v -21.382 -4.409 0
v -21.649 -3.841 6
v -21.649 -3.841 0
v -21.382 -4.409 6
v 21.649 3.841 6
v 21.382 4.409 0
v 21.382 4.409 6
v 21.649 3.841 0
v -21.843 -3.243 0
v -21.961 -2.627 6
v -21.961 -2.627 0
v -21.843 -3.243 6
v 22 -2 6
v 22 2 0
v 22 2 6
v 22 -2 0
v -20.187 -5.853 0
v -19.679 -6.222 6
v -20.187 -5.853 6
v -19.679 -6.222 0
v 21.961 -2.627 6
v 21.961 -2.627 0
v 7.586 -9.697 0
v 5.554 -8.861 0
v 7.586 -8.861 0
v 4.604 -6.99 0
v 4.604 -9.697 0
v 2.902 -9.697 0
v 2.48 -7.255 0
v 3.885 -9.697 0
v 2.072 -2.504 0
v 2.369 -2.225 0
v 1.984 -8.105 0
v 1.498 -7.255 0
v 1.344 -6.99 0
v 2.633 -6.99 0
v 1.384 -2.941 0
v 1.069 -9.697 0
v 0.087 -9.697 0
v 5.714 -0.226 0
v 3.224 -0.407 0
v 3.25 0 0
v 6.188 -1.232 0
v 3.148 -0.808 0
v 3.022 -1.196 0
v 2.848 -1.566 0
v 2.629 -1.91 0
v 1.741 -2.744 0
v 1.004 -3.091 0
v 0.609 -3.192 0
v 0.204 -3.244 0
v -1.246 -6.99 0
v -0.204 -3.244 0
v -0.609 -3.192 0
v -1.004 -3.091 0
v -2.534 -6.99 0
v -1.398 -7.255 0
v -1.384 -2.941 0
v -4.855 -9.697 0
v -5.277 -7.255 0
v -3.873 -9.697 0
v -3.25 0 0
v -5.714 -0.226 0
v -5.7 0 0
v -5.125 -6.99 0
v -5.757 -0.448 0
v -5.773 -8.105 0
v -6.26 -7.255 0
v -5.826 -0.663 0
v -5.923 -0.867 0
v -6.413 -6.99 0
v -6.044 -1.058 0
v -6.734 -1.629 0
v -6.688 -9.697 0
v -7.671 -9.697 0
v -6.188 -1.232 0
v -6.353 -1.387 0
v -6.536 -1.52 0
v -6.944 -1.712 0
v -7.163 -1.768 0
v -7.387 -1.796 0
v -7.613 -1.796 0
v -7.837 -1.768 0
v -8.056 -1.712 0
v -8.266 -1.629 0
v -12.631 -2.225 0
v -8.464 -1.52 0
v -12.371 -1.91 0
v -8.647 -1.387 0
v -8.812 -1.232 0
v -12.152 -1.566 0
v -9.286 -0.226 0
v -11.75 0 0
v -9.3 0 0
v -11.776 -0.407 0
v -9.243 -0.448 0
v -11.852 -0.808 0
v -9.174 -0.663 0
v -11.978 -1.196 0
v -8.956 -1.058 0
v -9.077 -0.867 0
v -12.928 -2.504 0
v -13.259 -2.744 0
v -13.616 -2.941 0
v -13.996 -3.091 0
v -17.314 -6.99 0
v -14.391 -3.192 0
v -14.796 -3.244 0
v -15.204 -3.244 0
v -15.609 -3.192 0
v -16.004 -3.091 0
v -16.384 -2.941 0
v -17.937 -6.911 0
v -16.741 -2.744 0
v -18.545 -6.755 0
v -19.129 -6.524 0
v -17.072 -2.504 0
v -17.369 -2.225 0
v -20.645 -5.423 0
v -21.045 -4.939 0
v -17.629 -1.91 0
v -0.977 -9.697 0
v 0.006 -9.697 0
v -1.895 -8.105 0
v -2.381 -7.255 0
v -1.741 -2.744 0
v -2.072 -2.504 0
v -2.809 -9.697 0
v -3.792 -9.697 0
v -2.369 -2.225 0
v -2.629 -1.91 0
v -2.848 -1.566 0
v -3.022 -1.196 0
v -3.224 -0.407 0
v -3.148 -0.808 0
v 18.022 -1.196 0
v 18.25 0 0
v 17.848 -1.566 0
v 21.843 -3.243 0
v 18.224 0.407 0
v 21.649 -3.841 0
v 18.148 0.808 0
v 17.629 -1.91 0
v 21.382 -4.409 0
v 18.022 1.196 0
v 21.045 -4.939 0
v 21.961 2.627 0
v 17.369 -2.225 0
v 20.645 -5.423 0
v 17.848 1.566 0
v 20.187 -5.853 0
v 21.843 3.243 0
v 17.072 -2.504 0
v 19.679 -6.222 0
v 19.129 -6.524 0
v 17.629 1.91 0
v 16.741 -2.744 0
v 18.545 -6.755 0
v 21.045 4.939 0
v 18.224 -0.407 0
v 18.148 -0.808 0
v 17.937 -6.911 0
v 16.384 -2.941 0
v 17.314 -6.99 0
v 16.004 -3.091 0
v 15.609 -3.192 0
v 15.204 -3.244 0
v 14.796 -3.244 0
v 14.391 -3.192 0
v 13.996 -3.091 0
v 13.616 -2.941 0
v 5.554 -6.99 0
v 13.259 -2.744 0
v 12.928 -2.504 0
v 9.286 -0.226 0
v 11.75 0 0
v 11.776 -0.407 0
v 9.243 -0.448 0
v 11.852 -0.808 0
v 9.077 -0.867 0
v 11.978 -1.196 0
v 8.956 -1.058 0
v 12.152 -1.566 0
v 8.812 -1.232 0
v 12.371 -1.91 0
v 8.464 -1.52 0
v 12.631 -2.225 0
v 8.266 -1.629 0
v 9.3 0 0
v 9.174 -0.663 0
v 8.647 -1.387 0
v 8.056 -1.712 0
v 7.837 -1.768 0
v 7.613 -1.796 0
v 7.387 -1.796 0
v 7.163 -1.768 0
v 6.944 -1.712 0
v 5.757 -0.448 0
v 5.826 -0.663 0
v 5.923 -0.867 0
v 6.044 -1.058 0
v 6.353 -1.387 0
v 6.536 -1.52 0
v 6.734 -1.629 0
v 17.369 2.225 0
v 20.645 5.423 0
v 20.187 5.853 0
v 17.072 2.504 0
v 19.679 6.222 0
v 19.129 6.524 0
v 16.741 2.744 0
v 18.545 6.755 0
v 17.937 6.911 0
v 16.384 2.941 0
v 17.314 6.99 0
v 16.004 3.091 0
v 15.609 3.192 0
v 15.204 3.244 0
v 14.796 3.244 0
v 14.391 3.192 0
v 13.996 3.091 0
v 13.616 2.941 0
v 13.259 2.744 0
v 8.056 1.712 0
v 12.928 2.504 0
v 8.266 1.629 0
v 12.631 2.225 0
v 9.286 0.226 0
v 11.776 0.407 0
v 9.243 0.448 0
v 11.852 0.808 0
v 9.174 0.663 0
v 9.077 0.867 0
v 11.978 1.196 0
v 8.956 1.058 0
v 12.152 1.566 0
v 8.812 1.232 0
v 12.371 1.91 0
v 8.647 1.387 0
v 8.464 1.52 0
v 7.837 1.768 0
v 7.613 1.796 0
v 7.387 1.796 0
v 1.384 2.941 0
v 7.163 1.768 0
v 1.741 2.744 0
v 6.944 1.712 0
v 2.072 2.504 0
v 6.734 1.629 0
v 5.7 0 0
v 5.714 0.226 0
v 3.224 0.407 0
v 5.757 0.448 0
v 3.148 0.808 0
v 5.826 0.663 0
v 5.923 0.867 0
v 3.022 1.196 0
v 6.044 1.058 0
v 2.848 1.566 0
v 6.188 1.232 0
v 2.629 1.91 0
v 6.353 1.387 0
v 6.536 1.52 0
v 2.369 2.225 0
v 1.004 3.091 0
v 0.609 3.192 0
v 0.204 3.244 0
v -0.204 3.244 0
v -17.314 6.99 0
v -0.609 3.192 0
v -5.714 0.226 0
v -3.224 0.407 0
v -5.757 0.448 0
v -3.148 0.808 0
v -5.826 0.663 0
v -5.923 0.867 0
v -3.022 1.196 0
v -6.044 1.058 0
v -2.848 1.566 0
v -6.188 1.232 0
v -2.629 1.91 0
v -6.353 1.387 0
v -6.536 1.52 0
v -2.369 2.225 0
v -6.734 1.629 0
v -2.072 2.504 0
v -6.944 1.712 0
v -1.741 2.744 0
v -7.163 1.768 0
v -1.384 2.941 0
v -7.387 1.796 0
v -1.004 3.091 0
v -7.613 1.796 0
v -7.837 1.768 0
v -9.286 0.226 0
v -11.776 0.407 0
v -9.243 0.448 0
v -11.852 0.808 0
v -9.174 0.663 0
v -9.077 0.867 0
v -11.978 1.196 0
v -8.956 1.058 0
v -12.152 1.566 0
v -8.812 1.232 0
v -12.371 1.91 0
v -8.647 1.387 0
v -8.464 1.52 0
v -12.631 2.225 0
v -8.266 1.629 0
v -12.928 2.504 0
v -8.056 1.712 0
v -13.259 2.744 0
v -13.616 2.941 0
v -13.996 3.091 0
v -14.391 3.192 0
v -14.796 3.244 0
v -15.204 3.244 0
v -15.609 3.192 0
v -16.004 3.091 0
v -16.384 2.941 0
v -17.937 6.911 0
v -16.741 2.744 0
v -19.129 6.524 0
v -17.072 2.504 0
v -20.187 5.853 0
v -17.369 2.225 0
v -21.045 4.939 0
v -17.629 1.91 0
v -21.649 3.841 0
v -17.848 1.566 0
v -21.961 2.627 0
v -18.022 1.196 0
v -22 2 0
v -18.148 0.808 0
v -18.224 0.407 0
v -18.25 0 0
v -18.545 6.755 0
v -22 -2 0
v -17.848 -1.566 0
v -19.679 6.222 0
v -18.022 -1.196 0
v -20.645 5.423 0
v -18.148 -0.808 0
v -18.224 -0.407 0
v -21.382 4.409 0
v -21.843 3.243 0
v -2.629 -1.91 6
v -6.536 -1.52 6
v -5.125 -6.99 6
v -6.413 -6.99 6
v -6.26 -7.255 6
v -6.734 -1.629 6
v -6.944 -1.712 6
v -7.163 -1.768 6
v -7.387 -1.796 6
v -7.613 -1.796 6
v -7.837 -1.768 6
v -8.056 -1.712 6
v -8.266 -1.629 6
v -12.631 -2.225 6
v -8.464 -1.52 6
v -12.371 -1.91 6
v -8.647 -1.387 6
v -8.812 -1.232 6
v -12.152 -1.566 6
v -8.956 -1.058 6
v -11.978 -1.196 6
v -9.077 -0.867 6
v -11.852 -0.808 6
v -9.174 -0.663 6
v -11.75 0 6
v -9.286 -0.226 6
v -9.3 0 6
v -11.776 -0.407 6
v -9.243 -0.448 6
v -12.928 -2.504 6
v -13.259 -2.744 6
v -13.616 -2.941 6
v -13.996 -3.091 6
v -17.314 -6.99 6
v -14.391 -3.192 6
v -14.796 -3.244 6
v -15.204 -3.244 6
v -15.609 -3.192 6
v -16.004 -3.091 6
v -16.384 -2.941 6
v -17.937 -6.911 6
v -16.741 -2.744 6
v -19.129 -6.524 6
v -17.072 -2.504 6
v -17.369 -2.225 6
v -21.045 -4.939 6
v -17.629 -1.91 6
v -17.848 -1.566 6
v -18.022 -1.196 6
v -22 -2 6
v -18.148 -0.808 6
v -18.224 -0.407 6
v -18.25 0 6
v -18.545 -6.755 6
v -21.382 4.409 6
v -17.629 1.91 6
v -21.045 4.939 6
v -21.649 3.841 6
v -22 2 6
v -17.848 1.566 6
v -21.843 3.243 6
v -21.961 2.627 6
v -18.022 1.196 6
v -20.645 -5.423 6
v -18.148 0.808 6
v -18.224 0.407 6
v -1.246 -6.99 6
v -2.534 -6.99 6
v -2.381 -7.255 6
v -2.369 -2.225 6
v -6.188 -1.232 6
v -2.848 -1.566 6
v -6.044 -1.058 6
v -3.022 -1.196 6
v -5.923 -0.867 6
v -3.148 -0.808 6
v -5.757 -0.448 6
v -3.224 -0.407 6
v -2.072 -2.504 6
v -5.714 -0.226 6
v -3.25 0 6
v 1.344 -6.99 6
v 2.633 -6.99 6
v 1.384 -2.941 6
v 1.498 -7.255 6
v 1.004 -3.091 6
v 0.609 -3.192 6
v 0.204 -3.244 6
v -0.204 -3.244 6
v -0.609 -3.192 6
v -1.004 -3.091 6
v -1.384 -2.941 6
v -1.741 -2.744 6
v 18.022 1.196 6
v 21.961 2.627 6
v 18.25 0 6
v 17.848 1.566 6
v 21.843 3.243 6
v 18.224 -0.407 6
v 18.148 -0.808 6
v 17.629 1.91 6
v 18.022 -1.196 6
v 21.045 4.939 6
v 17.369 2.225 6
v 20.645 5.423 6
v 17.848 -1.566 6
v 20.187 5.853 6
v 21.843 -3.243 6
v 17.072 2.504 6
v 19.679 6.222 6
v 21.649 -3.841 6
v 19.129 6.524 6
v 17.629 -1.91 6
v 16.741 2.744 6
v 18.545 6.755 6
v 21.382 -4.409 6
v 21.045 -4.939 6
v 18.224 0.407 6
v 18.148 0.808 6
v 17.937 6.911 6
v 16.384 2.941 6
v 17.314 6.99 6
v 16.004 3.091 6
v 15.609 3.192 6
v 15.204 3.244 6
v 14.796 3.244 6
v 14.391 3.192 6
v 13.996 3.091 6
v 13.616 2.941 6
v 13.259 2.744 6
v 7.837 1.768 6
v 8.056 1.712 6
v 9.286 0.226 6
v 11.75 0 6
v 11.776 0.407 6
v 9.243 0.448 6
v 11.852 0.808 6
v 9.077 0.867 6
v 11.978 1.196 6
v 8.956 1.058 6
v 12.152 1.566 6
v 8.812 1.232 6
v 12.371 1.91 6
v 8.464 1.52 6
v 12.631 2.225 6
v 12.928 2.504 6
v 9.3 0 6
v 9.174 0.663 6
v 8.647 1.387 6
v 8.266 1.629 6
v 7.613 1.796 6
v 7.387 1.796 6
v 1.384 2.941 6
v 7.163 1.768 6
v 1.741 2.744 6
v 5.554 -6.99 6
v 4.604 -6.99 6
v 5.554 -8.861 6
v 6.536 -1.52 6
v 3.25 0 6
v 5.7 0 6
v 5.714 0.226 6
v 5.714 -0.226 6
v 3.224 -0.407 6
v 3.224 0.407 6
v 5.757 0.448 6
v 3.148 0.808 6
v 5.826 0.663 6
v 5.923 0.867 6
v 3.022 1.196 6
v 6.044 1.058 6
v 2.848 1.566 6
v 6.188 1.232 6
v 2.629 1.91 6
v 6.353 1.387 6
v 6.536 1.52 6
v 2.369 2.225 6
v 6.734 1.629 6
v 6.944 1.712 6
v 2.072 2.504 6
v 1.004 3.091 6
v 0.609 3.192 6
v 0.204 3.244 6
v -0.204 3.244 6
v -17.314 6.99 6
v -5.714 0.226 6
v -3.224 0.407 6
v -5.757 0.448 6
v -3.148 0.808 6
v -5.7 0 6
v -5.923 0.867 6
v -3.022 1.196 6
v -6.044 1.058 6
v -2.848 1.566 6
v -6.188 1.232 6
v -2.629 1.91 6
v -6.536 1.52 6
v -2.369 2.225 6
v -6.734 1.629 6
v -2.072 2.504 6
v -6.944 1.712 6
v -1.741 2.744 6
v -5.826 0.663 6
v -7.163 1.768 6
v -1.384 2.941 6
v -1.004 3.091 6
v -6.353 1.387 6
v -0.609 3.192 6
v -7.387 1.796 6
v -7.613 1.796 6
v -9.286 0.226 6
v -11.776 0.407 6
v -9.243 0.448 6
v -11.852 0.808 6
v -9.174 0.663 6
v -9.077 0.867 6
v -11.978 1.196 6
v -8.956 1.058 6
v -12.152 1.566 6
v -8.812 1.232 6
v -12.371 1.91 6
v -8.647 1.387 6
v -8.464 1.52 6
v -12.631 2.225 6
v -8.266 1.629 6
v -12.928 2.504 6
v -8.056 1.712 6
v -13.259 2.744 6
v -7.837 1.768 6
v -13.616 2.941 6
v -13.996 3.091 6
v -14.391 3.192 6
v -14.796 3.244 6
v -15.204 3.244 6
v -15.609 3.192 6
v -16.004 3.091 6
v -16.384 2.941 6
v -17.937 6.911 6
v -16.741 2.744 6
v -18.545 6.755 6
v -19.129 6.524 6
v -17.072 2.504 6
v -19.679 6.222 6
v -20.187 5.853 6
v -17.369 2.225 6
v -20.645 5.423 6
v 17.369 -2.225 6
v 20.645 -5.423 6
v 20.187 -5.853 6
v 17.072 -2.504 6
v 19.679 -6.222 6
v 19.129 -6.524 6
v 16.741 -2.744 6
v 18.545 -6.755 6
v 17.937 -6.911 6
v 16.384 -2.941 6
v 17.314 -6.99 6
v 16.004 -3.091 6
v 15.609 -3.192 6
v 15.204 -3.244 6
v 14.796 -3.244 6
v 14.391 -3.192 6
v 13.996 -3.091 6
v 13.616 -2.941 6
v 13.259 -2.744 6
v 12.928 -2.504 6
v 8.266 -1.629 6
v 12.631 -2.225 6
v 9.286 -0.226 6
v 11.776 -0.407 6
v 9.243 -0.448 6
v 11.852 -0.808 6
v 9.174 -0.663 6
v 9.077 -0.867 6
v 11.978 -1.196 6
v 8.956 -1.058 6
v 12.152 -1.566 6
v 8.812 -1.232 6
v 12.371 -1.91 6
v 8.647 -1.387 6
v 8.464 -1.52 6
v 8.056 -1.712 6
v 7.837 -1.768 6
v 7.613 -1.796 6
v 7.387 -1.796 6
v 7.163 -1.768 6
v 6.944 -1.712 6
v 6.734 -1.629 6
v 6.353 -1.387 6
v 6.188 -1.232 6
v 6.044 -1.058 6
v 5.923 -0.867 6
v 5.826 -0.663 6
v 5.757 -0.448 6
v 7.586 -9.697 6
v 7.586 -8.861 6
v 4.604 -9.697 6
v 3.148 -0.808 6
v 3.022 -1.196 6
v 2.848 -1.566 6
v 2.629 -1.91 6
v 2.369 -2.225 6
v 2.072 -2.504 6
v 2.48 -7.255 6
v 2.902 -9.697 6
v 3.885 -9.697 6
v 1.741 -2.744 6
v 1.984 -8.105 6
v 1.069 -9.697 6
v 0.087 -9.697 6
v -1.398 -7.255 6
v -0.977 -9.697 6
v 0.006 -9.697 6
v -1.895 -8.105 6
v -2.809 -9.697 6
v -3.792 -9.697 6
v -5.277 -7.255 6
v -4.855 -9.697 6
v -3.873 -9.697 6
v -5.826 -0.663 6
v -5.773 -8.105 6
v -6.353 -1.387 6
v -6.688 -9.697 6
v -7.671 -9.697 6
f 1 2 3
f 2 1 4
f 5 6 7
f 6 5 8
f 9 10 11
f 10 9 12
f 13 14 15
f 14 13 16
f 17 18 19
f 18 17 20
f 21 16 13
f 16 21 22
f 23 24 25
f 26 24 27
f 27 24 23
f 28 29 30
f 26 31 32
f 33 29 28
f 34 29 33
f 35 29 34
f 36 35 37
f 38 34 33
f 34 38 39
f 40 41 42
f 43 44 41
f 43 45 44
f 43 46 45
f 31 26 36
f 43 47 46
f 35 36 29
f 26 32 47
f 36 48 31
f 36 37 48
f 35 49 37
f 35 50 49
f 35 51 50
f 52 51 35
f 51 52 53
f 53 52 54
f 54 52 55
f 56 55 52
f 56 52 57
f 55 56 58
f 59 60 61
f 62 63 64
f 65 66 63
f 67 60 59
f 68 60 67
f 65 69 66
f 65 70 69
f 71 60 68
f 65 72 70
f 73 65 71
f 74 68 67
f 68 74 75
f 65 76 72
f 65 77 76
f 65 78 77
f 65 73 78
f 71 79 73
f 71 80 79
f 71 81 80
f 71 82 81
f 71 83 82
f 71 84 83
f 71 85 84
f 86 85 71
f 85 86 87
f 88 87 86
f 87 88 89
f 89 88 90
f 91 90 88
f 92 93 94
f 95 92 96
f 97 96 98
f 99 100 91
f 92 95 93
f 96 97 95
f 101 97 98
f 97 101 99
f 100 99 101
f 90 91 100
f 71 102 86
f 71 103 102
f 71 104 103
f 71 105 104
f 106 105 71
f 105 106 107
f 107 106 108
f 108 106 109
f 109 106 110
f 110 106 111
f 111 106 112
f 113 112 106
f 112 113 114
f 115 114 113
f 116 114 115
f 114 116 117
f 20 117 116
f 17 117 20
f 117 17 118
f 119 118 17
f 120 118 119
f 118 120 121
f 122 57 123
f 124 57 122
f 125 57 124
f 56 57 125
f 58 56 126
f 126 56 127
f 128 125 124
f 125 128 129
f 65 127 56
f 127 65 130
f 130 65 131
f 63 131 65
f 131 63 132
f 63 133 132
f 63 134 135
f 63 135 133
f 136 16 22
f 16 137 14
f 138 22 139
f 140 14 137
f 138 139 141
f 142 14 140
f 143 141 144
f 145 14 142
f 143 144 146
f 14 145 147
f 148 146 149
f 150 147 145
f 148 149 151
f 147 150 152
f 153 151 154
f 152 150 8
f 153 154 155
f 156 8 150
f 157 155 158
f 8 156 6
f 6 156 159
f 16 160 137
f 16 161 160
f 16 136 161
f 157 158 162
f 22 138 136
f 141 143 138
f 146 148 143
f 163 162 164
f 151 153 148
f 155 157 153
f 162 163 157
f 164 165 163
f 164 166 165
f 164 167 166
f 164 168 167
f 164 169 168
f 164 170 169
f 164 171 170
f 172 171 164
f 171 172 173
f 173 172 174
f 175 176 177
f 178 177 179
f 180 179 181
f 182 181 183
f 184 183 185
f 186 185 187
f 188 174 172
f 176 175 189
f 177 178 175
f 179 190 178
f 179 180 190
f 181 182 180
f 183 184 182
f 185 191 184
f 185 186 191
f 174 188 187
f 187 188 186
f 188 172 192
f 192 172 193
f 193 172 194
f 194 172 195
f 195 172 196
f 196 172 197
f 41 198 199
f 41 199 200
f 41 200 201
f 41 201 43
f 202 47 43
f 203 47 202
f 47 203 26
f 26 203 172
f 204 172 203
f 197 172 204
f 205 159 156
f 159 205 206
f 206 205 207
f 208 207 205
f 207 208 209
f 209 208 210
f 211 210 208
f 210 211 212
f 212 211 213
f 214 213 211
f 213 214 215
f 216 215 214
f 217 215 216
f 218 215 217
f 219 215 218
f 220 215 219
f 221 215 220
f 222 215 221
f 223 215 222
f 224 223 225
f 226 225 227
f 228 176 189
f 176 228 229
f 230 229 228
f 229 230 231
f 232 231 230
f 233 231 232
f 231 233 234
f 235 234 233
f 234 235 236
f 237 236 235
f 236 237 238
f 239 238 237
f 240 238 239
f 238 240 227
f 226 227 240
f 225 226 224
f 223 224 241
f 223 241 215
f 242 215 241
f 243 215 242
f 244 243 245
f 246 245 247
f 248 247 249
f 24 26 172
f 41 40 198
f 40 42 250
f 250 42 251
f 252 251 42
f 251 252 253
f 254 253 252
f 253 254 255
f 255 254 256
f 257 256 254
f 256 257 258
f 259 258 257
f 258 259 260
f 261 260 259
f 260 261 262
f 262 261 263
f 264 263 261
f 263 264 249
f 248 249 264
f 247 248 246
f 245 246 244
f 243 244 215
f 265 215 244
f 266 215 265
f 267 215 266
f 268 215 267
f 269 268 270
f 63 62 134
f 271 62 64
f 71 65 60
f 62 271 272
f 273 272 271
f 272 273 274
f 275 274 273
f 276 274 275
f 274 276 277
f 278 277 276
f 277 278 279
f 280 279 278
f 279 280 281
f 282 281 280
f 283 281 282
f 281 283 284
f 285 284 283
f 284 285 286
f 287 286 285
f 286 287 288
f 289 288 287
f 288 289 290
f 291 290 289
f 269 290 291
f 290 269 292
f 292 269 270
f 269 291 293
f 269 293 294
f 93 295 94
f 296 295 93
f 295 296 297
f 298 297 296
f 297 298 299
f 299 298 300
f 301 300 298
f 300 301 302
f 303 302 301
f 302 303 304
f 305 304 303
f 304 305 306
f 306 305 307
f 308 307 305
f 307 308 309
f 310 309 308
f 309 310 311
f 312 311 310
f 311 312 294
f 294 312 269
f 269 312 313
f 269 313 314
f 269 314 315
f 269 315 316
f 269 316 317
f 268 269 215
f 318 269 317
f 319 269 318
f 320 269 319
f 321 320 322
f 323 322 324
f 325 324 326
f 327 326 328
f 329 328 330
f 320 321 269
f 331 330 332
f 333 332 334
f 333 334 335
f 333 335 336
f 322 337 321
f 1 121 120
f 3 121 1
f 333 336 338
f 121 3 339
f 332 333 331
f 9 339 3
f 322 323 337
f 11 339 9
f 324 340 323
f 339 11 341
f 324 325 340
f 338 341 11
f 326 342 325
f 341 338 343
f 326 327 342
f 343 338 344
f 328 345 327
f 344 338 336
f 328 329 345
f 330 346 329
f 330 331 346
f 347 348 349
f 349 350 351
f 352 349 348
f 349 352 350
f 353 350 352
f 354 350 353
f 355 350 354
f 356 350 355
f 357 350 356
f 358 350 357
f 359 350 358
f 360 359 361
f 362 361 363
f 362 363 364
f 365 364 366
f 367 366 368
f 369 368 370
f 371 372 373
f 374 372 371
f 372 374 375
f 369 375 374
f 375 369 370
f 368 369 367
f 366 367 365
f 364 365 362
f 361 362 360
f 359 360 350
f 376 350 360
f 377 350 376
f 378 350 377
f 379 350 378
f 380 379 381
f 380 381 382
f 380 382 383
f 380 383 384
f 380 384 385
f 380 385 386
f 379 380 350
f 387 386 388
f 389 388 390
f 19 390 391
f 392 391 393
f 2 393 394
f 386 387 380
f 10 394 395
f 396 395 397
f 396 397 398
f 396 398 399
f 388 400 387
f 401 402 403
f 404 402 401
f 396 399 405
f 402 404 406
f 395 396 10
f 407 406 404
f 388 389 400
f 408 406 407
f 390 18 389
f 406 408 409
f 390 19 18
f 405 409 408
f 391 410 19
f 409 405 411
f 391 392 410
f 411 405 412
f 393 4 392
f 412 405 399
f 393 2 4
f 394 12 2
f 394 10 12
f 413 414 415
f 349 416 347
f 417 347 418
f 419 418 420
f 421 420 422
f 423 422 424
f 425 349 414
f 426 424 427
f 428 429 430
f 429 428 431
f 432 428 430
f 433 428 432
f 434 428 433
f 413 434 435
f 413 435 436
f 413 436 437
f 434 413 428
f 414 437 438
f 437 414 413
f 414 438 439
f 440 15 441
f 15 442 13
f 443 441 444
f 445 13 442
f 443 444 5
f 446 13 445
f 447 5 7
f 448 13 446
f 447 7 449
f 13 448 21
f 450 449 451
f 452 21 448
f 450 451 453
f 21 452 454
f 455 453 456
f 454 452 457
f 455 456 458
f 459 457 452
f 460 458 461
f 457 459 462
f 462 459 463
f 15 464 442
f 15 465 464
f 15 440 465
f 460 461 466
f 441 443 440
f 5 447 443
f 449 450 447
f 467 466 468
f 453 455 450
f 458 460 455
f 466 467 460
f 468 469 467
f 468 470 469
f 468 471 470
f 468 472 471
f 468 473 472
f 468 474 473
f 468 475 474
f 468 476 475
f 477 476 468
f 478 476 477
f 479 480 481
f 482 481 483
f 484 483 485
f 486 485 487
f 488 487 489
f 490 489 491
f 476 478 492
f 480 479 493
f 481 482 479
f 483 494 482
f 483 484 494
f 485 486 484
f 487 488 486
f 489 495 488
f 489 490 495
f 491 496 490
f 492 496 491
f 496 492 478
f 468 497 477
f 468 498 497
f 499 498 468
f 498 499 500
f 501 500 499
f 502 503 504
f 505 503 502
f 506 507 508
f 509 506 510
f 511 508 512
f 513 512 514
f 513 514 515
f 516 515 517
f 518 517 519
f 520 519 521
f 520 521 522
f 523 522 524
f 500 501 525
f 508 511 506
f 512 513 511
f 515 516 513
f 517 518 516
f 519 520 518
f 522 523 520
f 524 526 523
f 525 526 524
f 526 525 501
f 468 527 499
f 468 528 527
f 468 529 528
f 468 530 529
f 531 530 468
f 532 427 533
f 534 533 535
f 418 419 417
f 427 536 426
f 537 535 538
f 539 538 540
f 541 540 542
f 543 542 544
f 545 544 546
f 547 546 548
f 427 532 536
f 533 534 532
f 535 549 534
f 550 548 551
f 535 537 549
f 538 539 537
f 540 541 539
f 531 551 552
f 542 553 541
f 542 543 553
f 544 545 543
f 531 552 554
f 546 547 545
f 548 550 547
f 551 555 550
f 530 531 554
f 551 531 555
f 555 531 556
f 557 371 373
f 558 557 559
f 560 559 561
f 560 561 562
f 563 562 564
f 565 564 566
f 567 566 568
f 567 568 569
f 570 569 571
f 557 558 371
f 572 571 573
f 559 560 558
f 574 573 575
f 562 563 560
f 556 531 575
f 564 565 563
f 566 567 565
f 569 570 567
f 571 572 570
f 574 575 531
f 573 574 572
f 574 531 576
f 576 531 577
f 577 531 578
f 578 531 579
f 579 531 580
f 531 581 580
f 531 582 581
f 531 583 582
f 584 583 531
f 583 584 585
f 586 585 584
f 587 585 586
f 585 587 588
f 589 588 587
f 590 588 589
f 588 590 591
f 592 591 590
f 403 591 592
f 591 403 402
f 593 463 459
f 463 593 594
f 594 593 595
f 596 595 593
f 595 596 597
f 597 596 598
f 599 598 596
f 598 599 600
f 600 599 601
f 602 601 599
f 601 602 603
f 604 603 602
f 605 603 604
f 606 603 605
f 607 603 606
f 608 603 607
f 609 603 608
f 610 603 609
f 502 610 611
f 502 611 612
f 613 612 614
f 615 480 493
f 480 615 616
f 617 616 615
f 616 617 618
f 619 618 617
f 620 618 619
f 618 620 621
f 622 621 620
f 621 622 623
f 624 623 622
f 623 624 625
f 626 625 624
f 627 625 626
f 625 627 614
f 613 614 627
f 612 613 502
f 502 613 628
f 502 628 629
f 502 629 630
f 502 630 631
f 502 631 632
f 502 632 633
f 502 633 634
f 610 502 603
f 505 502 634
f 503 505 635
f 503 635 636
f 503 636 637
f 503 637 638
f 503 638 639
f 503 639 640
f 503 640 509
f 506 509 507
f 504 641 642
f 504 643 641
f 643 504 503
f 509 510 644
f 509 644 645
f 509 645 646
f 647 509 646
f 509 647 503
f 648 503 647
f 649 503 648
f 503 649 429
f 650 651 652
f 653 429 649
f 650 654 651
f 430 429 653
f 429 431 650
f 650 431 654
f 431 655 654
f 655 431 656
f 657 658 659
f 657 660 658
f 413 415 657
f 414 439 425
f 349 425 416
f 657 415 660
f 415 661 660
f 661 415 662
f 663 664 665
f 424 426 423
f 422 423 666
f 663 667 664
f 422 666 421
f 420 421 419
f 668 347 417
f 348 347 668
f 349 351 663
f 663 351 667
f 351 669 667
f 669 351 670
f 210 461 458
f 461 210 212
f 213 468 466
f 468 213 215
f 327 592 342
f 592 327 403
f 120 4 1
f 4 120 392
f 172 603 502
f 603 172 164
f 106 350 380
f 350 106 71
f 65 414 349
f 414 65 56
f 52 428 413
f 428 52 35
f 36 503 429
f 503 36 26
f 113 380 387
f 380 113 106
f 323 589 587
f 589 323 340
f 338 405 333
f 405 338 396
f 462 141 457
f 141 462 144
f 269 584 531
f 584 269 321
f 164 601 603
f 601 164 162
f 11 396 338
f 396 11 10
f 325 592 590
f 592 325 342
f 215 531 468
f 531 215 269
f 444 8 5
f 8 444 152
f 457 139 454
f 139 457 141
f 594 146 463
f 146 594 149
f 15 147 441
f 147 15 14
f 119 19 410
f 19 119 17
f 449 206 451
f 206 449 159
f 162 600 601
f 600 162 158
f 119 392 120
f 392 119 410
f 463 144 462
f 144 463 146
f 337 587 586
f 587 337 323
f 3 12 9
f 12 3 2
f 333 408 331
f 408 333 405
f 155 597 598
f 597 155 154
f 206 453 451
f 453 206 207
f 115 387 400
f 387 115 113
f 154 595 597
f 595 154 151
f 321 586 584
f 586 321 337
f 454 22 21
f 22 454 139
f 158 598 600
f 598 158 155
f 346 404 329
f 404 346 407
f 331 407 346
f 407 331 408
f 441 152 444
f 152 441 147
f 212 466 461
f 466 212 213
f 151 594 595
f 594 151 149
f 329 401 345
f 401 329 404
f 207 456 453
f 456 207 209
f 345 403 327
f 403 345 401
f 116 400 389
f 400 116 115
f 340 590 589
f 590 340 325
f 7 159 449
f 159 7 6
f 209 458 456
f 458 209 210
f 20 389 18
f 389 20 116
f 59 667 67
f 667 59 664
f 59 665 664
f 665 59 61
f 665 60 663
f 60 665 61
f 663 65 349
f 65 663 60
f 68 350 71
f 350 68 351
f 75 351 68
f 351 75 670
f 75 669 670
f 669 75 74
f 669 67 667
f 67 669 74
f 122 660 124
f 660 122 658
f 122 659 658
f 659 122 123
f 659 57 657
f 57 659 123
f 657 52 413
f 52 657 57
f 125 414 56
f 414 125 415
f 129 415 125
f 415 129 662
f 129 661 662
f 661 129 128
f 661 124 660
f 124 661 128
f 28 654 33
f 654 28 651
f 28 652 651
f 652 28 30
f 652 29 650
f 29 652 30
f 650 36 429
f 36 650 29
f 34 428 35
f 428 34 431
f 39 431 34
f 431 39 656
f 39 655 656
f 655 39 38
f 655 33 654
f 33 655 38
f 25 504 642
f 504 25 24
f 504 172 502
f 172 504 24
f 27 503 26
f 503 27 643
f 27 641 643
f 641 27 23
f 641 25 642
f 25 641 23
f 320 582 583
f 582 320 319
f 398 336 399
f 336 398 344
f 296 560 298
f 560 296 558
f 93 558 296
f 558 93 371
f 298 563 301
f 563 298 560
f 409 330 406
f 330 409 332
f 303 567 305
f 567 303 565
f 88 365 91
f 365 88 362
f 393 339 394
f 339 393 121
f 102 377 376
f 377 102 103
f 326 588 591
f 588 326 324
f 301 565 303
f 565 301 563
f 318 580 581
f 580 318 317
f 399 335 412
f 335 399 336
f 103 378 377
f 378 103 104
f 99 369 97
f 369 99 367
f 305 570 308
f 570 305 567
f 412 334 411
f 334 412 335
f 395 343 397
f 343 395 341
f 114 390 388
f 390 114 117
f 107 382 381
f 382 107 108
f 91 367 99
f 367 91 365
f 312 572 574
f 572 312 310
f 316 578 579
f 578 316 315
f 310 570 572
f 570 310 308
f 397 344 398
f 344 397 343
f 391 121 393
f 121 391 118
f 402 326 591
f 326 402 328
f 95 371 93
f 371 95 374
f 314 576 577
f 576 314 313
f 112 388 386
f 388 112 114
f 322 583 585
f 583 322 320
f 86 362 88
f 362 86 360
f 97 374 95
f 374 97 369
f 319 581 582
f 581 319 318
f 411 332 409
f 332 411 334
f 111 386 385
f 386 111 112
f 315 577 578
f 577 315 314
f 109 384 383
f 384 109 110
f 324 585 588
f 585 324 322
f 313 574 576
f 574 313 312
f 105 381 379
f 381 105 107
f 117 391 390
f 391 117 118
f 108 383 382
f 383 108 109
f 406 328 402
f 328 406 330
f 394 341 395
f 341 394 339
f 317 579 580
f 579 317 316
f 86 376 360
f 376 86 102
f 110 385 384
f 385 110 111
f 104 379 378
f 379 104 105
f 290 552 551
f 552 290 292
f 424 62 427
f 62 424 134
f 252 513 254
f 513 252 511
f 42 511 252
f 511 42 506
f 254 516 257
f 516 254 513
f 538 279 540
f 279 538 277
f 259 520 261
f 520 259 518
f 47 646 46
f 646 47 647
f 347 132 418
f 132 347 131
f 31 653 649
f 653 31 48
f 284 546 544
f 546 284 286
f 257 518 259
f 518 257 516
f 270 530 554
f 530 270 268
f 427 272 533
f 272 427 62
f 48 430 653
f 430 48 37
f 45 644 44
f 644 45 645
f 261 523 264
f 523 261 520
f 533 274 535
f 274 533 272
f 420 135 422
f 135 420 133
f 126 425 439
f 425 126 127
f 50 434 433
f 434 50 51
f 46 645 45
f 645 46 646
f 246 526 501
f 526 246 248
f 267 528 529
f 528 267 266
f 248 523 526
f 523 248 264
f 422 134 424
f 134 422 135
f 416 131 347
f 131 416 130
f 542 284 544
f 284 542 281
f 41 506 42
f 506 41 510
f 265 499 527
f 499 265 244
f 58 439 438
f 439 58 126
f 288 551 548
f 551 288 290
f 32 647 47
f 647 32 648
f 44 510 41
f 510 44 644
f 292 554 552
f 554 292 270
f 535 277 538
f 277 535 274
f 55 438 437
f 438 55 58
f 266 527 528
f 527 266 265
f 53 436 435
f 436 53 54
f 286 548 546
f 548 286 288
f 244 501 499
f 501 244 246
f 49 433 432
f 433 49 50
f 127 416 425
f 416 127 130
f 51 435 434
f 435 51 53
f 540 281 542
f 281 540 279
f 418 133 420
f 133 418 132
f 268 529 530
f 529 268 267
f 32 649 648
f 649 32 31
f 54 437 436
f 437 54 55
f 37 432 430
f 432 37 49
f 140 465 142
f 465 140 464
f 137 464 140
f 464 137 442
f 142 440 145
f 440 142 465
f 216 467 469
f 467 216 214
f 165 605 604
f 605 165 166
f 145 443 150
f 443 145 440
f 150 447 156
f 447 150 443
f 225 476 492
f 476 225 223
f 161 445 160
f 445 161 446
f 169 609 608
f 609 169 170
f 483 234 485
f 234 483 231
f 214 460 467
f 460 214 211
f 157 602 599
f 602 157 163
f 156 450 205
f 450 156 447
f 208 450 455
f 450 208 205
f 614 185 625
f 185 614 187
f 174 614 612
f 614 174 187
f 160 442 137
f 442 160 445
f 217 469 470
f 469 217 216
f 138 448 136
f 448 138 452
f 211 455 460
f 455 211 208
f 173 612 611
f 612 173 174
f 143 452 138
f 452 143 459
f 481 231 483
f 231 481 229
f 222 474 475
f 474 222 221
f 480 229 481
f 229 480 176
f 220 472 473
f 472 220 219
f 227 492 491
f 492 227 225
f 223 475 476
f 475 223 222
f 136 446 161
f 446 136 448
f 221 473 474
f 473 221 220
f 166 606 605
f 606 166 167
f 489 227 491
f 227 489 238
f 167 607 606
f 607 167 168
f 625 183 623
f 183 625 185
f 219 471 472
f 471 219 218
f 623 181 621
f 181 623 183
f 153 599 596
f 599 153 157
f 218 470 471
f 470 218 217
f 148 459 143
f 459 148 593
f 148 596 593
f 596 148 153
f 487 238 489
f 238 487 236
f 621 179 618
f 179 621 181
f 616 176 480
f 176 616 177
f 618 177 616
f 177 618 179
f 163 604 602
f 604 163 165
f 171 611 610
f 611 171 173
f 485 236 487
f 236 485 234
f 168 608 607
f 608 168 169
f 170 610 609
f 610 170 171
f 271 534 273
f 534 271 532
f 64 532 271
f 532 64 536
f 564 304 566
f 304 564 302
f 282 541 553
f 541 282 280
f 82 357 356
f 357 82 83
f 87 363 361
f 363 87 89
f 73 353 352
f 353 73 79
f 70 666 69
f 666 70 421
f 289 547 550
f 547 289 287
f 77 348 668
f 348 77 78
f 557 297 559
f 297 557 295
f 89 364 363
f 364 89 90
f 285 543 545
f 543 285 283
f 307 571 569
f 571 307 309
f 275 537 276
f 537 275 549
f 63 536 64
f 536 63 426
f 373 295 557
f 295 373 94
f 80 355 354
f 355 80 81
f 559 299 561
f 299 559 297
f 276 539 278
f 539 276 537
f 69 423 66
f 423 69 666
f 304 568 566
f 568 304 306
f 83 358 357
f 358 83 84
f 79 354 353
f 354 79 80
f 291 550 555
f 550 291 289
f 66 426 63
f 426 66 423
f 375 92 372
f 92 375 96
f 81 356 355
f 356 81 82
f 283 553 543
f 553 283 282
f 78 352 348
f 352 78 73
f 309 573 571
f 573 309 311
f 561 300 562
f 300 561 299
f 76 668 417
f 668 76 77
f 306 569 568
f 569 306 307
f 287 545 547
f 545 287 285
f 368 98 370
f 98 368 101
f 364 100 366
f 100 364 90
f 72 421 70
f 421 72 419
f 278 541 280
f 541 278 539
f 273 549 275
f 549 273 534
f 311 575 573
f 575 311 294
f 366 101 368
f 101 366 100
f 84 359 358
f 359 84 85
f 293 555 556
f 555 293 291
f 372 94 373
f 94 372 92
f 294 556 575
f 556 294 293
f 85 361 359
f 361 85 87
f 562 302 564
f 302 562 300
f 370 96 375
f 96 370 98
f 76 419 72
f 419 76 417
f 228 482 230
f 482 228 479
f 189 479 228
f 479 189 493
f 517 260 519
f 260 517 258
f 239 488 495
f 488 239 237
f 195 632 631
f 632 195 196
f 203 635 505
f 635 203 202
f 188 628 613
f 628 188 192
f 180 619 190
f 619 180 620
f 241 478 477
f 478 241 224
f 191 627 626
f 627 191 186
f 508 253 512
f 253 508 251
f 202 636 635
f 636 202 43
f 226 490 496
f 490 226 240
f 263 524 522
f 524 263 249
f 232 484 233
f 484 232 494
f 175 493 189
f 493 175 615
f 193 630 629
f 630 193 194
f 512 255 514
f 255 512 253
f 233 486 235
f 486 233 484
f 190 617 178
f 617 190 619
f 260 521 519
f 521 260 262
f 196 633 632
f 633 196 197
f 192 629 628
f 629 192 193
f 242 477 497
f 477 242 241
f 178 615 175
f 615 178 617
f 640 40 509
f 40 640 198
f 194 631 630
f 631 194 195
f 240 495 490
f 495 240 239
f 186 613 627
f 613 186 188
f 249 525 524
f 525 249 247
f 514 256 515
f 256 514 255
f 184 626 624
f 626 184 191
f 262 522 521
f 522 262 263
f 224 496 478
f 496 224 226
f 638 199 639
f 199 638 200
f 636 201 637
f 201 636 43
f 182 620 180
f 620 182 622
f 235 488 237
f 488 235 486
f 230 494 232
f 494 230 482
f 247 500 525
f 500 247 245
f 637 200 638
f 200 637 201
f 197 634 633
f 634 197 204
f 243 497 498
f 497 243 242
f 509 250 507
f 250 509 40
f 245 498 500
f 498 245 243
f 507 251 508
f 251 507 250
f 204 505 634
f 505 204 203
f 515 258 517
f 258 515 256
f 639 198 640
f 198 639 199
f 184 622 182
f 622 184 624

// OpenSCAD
$fn = 50;


difference() {
	union() {
		hull() {
			translate(v = [-17.0000000000, 2.0000000000, 0]) {
				cylinder(h = 6, r = 5);
			}
			translate(v = [17.0000000000, 2.0000000000, 0]) {
				cylinder(h = 6, r = 5);
			}
			translate(v = [-17.0000000000, -2.0000000000, 0]) {
				cylinder(h = 6, r = 5);
			}
			translate(v = [17.0000000000, -2.0000000000, 0]) {
				cylinder(h = 6, r = 5);
			}
		}
		translate(v = [0, -5, 0]) {
			linear_extrude(height = 6) {
				text(font = "DejaVu Sans Mono:style=Bold", halign = "center", size = 4.7500000000, text = "XXXL", valign = "top");
			}
		}
	}
	union() {
		translate(v = [-15.0000000000, 0.0000000000, 0]) {
			translate(v = [0, 0, -100]) {
				cylinder(h = 200, r = 3.2500000000);
			}
		}
		translate(v = [0, 0, -100]) {
			cylinder(h = 200, r = 3.2500000000);
		}
		translate(v = [15.0000000000, 0.0000000000, 0]) {
			translate(v = [0, 0, -100]) {
				cylinder(h = 200, r = 3.2500000000);
			}
		}
		translate(v = [-15.0000000000, 0.0000000000, 0]) {
			translate(v = [0, 0, -100]) {
				cylinder(h = 200, r = 1.8000000000);
			}
		}
		translate(v = [-7.5000000000, 0.0000000000, 0]) {
			translate(v = [0, 0, -100]) {
				cylinder(h = 200, r = 1.8000000000);
			}
		}
		translate(v = [0, 0, -100]) {
			cylinder(h = 200, r = 1.8000000000);
		}
		translate(v = [7.5000000000, 0.0000000000, 0]) {
			translate(v = [0, 0, -100]) {
				cylinder(h = 200, r = 1.8000000000);
			}
		}
		translate(v = [15.0000000000, 0.0000000000, 0]) {
			translate(v = [0, 0, -100]) {
				cylinder(h = 200, r = 1.8000000000);
			}
		}
	}
}
